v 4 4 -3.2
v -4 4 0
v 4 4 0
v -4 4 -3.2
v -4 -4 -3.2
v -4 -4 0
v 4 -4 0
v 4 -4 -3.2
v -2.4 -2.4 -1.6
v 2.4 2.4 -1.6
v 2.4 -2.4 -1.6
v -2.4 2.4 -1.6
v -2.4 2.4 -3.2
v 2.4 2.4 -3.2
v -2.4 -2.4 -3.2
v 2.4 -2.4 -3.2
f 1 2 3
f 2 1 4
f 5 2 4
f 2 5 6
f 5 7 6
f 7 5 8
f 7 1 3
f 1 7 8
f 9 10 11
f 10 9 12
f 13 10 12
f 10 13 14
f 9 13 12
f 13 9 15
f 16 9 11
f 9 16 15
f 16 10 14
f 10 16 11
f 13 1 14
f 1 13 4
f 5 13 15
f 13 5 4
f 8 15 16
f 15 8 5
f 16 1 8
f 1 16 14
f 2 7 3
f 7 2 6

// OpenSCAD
// file: ../p/4-4edge.scad
use <../lib.scad>
$fa=1; $fs=0.2;
function ldraw_lib__4_4edge(realsolid=false) = [
// 0 Circle 1.0
// 0 Name: 4-4edge.dat
// 0 Author: James Jessiman
// 0 !LDRAW_ORG Primitive UPDATE 2017-01
// 0 !LICENSE Licensed under CC BY 2.0 and CC BY 4.0 : see CAreadme.txt
// 
// 0 BFC CERTIFY CCW
  [0,"BFC","CERTIFY"],
  [0,"BFC","CCW"],
// 
// 0 !HISTORY 1998-12-15 [PTadmin] Official Update 1998-10
// 0 !HISTORY 2005-12-28 [PTadmin] Official Update 2005-01
// 0 !HISTORY 2007-06-24 [PTadmin] Header formatted for Contributor Agreement
// 0 !HISTORY 2008-07-01 [PTadmin] Official Update 2008-01
// 0 !HISTORY 2017-01-15 [Steffen] BFCed
// 0 !HISTORY 2017-12-30 [PTadmin] Official Update 2017-01
// 
// 
// 2 24 1 0 0 0.9239 0 0.3827
  [2,24,1,0,0,0.9239,0,0.3827],
// 2 24 0.9239 0 0.3827 0.7071 0 0.7071
  [2,24,0.9239,0,0.3827,0.7071,0,0.7071],
// 2 24 0.7071 0 0.7071 0.3827 0 0.9239
  [2,24,0.7071,0,0.7071,0.3827,0,0.9239],
// 2 24 0.3827 0 0.9239 0 0 1
  [2,24,0.3827,0,0.9239,0,0,1],
// 2 24 0 0 1 -0.3827 0 0.9239
  [2,24,0,0,1,-0.3827,0,0.9239],
// 2 24 -0.3827 0 0.9239 -0.7071 0 0.7071
  [2,24,-0.3827,0,0.9239,-0.7071,0,0.7071],
// 2 24 -0.7071 0 0.7071 -0.9239 0 0.3827
  [2,24,-0.7071,0,0.7071,-0.9239,0,0.3827],
// 2 24 -0.9239 0 0.3827 -1 0 -0
  [2,24,-0.9239,0,0.3827,-1,0,-0],
// 2 24 -1 0 -0 -0.9239 0 -0.3827
  [2,24,-1,0,-0,-0.9239,0,-0.3827],
// 2 24 -0.9239 0 -0.3827 -0.7071 0 -0.7071
  [2,24,-0.9239,0,-0.3827,-0.7071,0,-0.7071],
// 2 24 -0.7071 0 -0.7071 -0.3827 0 -0.9239
  [2,24,-0.7071,0,-0.7071,-0.3827,0,-0.9239],
// 2 24 -0.3827 0 -0.9239 0 0 -1
  [2,24,-0.3827,0,-0.9239,0,0,-1],
// 2 24 0 0 -1 0.3827 0 -0.9239
  [2,24,0,0,-1,0.3827,0,-0.9239],
// 2 24 0.3827 0 -0.9239 0.7071 0 -0.7071
  [2,24,0.3827,0,-0.9239,0.7071,0,-0.7071],
// 2 24 0.7071 0 -0.7071 0.9239 0 -0.3827
  [2,24,0.7071,0,-0.7071,0.9239,0,-0.3827],
// 2 24 0.9239 0 -0.3827 1 0 0
  [2,24,0.9239,0,-0.3827,1,0,0],
];
module ldraw_lib__4_4edge(step=0, col=false, unit=2/5, alt=false, line=0.2, solid=!$preview)
    makepoly(ldraw_lib__4_4edge(solid), step=step, col=col, unit=unit, alt=alt, line=line, solid=solid);
ldraw_lib__4_4edge(line=0.2);
// file: ../p/4-4disc.scad
use <../lib.scad>
$fa=1; $fs=0.2;
function ldraw_lib__4_4disc(realsolid=false) = [
// 0 Disc 1.0
// 0 Name: 4-4disc.dat
// 0 Author: James Jessiman
// 0 !LDRAW_ORG Primitive UPDATE 2002-02
// 0 !LICENSE Licensed under CC BY 2.0 and CC BY 4.0 : see CAreadme.txt
// 
// 0 BFC CERTIFY CCW
  [0,"BFC","CERTIFY"],
  [0,"BFC","CCW"],
// 
// 0 !HISTORY 1998-12-15 [PTadmin] Official Update 1998-10
// 0 !HISTORY 2002-03-23 [sbliss] Added BFC statement
// 0 !HISTORY 2002-04-25 [PTadmin] Official Update 2002-02
// 0 !HISTORY 2007-06-24 [PTadmin] Header formatted for Contributor Agreement
// 0 !HISTORY 2008-07-01 [PTadmin] Official Update 2008-01
// 
// 
// 3 16 0 0 0 1 0 0 0.9239 0 0.3827
  [3,16,0,0,0,1,0,0,0.9239,0,0.3827],
// 3 16 0 0 0 0.9239 0 0.3827 0.7071 0 0.7071
  [3,16,0,0,0,0.9239,0,0.3827,0.7071,0,0.7071],
// 3 16 0 0 0 0.7071 0 0.7071 0.3827 0 0.9239
  [3,16,0,0,0,0.7071,0,0.7071,0.3827,0,0.9239],
// 3 16 0 0 0 0.3827 0 0.9239 0 0 1
  [3,16,0,0,0,0.3827,0,0.9239,0,0,1],
// 3 16 0 0 0 0 0 1 -0.3827 0 0.9239
  [3,16,0,0,0,0,0,1,-0.3827,0,0.9239],
// 3 16 0 0 0 -0.3827 0 0.9239 -0.7071 0 0.7071
  [3,16,0,0,0,-0.3827,0,0.9239,-0.7071,0,0.7071],
// 3 16 0 0 0 -0.7071 0 0.7071 -0.9239 0 0.3827
  [3,16,0,0,0,-0.7071,0,0.7071,-0.9239,0,0.3827],
// 3 16 0 0 0 -0.9239 0 0.3827 -1 0 -0
  [3,16,0,0,0,-0.9239,0,0.3827,-1,0,-0],
// 3 16 0 0 0 -1 0 -0 -0.9239 0 -0.3827
  [3,16,0,0,0,-1,0,-0,-0.9239,0,-0.3827],
// 3 16 0 0 0 -0.9239 0 -0.3827 -0.7071 0 -0.7071
  [3,16,0,0,0,-0.9239,0,-0.3827,-0.7071,0,-0.7071],
// 3 16 0 0 0 -0.7071 0 -0.7071 -0.3827 0 -0.9239
  [3,16,0,0,0,-0.7071,0,-0.7071,-0.3827,0,-0.9239],
// 3 16 0 0 0 -0.3827 0 -0.9239 0 0 -1
  [3,16,0,0,0,-0.3827,0,-0.9239,0,0,-1],
// 3 16 0 0 0 0 0 -1 0.3827 0 -0.9239
  [3,16,0,0,0,0,0,-1,0.3827,0,-0.9239],
// 3 16 0 0 0 0.3827 0 -0.9239 0.7071 0 -0.7071
  [3,16,0,0,0,0.3827,0,-0.9239,0.7071,0,-0.7071],
// 3 16 0 0 0 0.7071 0 -0.7071 0.9239 0 -0.3827
  [3,16,0,0,0,0.7071,0,-0.7071,0.9239,0,-0.3827],
// 3 16 0 0 0 0.9239 0 -0.3827 1 0 0
  [3,16,0,0,0,0.9239,0,-0.3827,1,0,0],
// 0
];
module ldraw_lib__4_4disc(step=0, col=false, unit=2/5, alt=false, line=0.2, solid=!$preview)
    makepoly(ldraw_lib__4_4disc(solid), step=step, col=col, unit=unit, alt=alt, line=line, solid=solid);
ldraw_lib__4_4disc(line=0.2);
// file: ../p/4-4cyli.scad
use <../lib.scad>
$fa=1; $fs=0.2;
function ldraw_lib__4_4cyli(realsolid=false) = [
// 0 Cylinder 1.0
// 0 Name: 4-4cyli.dat
// 0 Author: James Jessiman
// 0 !LDRAW_ORG Primitive UPDATE 2005-01
// 0 !LICENSE Licensed under CC BY 2.0 and CC BY 4.0 : see CAreadme.txt
// 
// 0 BFC CERTIFY CCW
  [0,"BFC","CERTIFY"],
  [0,"BFC","CCW"],
// 
// 0 !HISTORY 1998-12-15 [PTadmin] Official Update 1998-10
// 0 !HISTORY 2002-03-23 [sbliss] Added BFC statement; merged headers from files in distributions LDraw 0.27 and Complete.
// 0 !HISTORY 2002-04-25 [PTadmin] Official Update 2002-02
// 0 !HISTORY 2004-12-14 [guyvivan] BFC CCW
// 0 !HISTORY 2005-12-28 [PTadmin] Official Update 2005-01
// 0 !HISTORY 2007-06-24 [PTadmin] Header formatted for Contributor Agreement
// 0 !HISTORY 2008-07-01 [PTadmin] Official Update 2008-01
// 
// 
// 4 16 1 1 0 0.9239 1 0.3827 0.9239 0 0.3827 1 0 0
  [4,16,1,1,0,0.9239,1,0.3827,0.9239,0,0.3827,1,0,0],
// 5 24 1 0 0 1 1 0 0.9239 0 0.3827 0.9239 0 -0.3827
  [5,24,1,0,0,1,1,0,0.9239,0,0.3827,0.9239,0,-0.3827],
// 4 16 0.9239 1 0.3827 0.7071 1 0.7071 0.7071 0 0.7071 0.9239 0 0.3827
  [4,16,0.9239,1,0.3827,0.7071,1,0.7071,0.7071,0,0.7071,0.9239,0,0.3827],
// 5 24 0.9239 0 0.3827 0.9239 1 0.3827 0.7071 0 0.7071 1 0 0
  [5,24,0.9239,0,0.3827,0.9239,1,0.3827,0.7071,0,0.7071,1,0,0],
// 4 16 0.7071 1 0.7071 0.3827 1 0.9239 0.3827 0 0.9239 0.7071 0 0.7071
  [4,16,0.7071,1,0.7071,0.3827,1,0.9239,0.3827,0,0.9239,0.7071,0,0.7071],
// 5 24 0.7071 0 0.7071 0.7071 1 0.7071 0.3827 0 0.9239 0.9239 0 0.3827
  [5,24,0.7071,0,0.7071,0.7071,1,0.7071,0.3827,0,0.9239,0.9239,0,0.3827],
// 4 16 0.3827 1 0.9239 0 1 1 0 0 1 0.3827 0 0.9239
  [4,16,0.3827,1,0.9239,0,1,1,0,0,1,0.3827,0,0.9239],
// 5 24 0.3827 0 0.9239 0.3827 1 0.9239 0 0 1 0.7071 0 0.7071
  [5,24,0.3827,0,0.9239,0.3827,1,0.9239,0,0,1,0.7071,0,0.7071],
// 4 16 0 1 1 -0.3827 1 0.9239 -0.3827 0 0.9239 0 0 1
  [4,16,0,1,1,-0.3827,1,0.9239,-0.3827,0,0.9239,0,0,1],
// 5 24 0 0 1 0 1 1 -0.3827 0 0.9239 0.3827 0 0.9239
  [5,24,0,0,1,0,1,1,-0.3827,0,0.9239,0.3827,0,0.9239],
// 4 16 -0.3827 1 0.9239 -0.7071 1 0.7071 -0.7071 0 0.7071 -0.3827 0 0.9239
  [4,16,-0.3827,1,0.9239,-0.7071,1,0.7071,-0.7071,0,0.7071,-0.3827,0,0.9239],
// 5 24 -0.3827 0 0.9239 -0.3827 1 0.9239 -0.7071 0 0.7071 0 0 1
  [5,24,-0.3827,0,0.9239,-0.3827,1,0.9239,-0.7071,0,0.7071,0,0,1],
// 4 16 -0.7071 1 0.7071 -0.9239 1 0.3827 -0.9239 0 0.3827 -0.7071 0 0.7071
  [4,16,-0.7071,1,0.7071,-0.9239,1,0.3827,-0.9239,0,0.3827,-0.7071,0,0.7071],
// 5 24 -0.7071 0 0.7071 -0.7071 1 0.7071 -0.9239 0 0.3827 -0.3827 0 0.9239
  [5,24,-0.7071,0,0.7071,-0.7071,1,0.7071,-0.9239,0,0.3827,-0.3827,0,0.9239],
// 4 16 -0.9239 1 0.3827 -1 1 0 -1 0 0 -0.9239 0 0.3827
  [4,16,-0.9239,1,0.3827,-1,1,0,-1,0,0,-0.9239,0,0.3827],
// 5 24 -0.9239 0 0.3827 -0.9239 1 0.3827 -1 0 0 -0.7071 0 0.7071
  [5,24,-0.9239,0,0.3827,-0.9239,1,0.3827,-1,0,0,-0.7071,0,0.7071],
// 4 16 -1 1 0 -0.9239 1 -0.3827 -0.9239 0 -0.3827 -1 0 0
  [4,16,-1,1,0,-0.9239,1,-0.3827,-0.9239,0,-0.3827,-1,0,0],
// 5 24 -1 0 0 -1 1 0 -0.9239 0 -0.3827 -0.9239 0 0.3827
  [5,24,-1,0,0,-1,1,0,-0.9239,0,-0.3827,-0.9239,0,0.3827],
// 4 16 -0.9239 1 -0.3827 -0.7071 1 -0.7071 -0.7071 0 -0.7071 -0.9239 0 -0.3827
  [4,16,-0.9239,1,-0.3827,-0.7071,1,-0.7071,-0.7071,0,-0.7071,-0.9239,0,-0.3827],
// 5 24 -0.9239 0 -0.3827 -0.9239 1 -0.3827 -0.7071 0 -0.7071 -1 0 0
  [5,24,-0.9239,0,-0.3827,-0.9239,1,-0.3827,-0.7071,0,-0.7071,-1,0,0],
// 4 16 -0.7071 1 -0.7071 -0.3827 1 -0.9239 -0.3827 0 -0.9239 -0.7071 0 -0.7071
  [4,16,-0.7071,1,-0.7071,-0.3827,1,-0.9239,-0.3827,0,-0.9239,-0.7071,0,-0.7071],
// 5 24 -0.7071 0 -0.7071 -0.7071 1 -0.7071 -0.3827 0 -0.9239 -0.9239 0 -0.3827
  [5,24,-0.7071,0,-0.7071,-0.7071,1,-0.7071,-0.3827,0,-0.9239,-0.9239,0,-0.3827],
// 4 16 -0.3827 1 -0.9239 0 1 -1 0 0 -1 -0.3827 0 -0.9239
  [4,16,-0.3827,1,-0.9239,0,1,-1,0,0,-1,-0.3827,0,-0.9239],
// 5 24 -0.3827 0 -0.9239 -0.3827 1 -0.9239 0 0 -1 -0.7071 0 -0.7071
  [5,24,-0.3827,0,-0.9239,-0.3827,1,-0.9239,0,0,-1,-0.7071,0,-0.7071],
// 4 16 0 1 -1 0.3827 1 -0.9239 0.3827 0 -0.9239 0 0 -1
  [4,16,0,1,-1,0.3827,1,-0.9239,0.3827,0,-0.9239,0,0,-1],
// 5 24 0 0 -1 0 1 -1 0.3827 0 -0.9239 -0.3827 0 -0.9239
  [5,24,0,0,-1,0,1,-1,0.3827,0,-0.9239,-0.3827,0,-0.9239],
// 4 16 0.3827 1 -0.9239 0.7071 1 -0.7071 0.7071 0 -0.7071 0.3827 0 -0.9239
  [4,16,0.3827,1,-0.9239,0.7071,1,-0.7071,0.7071,0,-0.7071,0.3827,0,-0.9239],
// 5 24 0.3827 0 -0.9239 0.3827 1 -0.9239 0.7071 0 -0.7071 0 0 -1
  [5,24,0.3827,0,-0.9239,0.3827,1,-0.9239,0.7071,0,-0.7071,0,0,-1],
// 4 16 0.7071 1 -0.7071 0.9239 1 -0.3827 0.9239 0 -0.3827 0.7071 0 -0.7071
  [4,16,0.7071,1,-0.7071,0.9239,1,-0.3827,0.9239,0,-0.3827,0.7071,0,-0.7071],
// 5 24 0.7071 0 -0.7071 0.7071 1 -0.7071 0.9239 0 -0.3827 0.3827 0 -0.9239
  [5,24,0.7071,0,-0.7071,0.7071,1,-0.7071,0.9239,0,-0.3827,0.3827,0,-0.9239],
// 4 16 0.9239 1 -0.3827 1 1 0 1 0 0 0.9239 0 -0.3827
  [4,16,0.9239,1,-0.3827,1,1,0,1,0,0,0.9239,0,-0.3827],
// 5 24 0.9239 0 -0.3827 0.9239 1 -0.3827 1 0 0 0.7071 0 -0.7071
  [5,24,0.9239,0,-0.3827,0.9239,1,-0.3827,1,0,0,0.7071,0,-0.7071],
// 0
];
module ldraw_lib__4_4cyli(step=0, col=false, unit=2/5, alt=false, line=0.2, solid=!$preview)
    makepoly(ldraw_lib__4_4cyli(solid), step=step, col=col, unit=unit, alt=alt, line=line, solid=solid);
ldraw_lib__4_4cyli(line=0.2);
// file: ../p/stud3.scad
use <../lib.scad>
use <4-4cyli.scad>
use <4-4disc.scad>
use <4-4edge.scad>
$fa=1; $fs=0.2;
function ldraw_lib__stud3(realsolid=false) = realsolid ? 
    [openscad(translate([0,0,-eps()], o=cylinder(4+eps(), r=4)),2)] : [
// 0 Stud Tube Solid
// 0 Name: stud3.dat
// 0 Author: James Jessiman
// 0 !LDRAW_ORG Primitive UPDATE 2012-01
// 0 !LICENSE Licensed under CC BY 2.0 and CC BY 4.0 : see CAreadme.txt
// 
// 0 BFC CERTIFY CCW
  [0,"BFC","CERTIFY"],
  [0,"BFC","CCW"],
// 
// 0 !HISTORY 2002-04-04 [sbliss] Modified for BFC compliance
// 0 !HISTORY 2002-04-25 [PTadmin] Official Update 2002-02
// 0 !HISTORY 2007-06-24 [PTadmin] Header formatted for Contributor Agreement
// 0 !HISTORY 2008-07-01 [PTadmin] Official Update 2008-01
// 0 !HISTORY 2012-02-16 [Philo] Changed to CCW
// 0 !HISTORY 2012-03-30 [PTadmin] Official Update 2012-01
// 
// 
// 1 16 0 -4 0 4 0 0 0 1 0 0 0 4 4-4edge.dat
  [1,16,0,-4,0,4,0,0,0,1,0,0,0,4, ldraw_lib__4_4edge(realsolid)],
// 1 16 0 0 0 4 0 0 0 1 0 0 0 4 4-4edge.dat
  [1,16,0,0,0,4,0,0,0,1,0,0,0,4, ldraw_lib__4_4edge(realsolid)],
// 1 16 0 -4 0 4 0 0 0 1 0 0 0 4 4-4disc.dat
  [1,16,0,-4,0,4,0,0,0,1,0,0,0,4, ldraw_lib__4_4disc(realsolid)],
// 1 16 0 -4 0 4 0 0 0 4 0 0 0 4 4-4cyli.dat
  [1,16,0,-4,0,4,0,0,0,4,0,0,0,4, ldraw_lib__4_4cyli(realsolid)],
];
module ldraw_lib__stud3(step=0, col=false, unit=2/5, alt=false, line=0.2, solid=!$preview)
    makepoly(ldraw_lib__stud3(solid), step=step, col=col, unit=unit, alt=alt, line=line, solid=solid);
ldraw_lib__stud3(line=0.2);
// file: ../p/stud.scad
use <../lib.scad>
use <4-4cyli.scad>
use <4-4disc.scad>
use <4-4edge.scad>
$fa=1; $fs=0.2;
function ldraw_lib__stud(realsolid=false) = realsolid ? 
    [openscad(translate([0,0,-eps()], o=cylinder(4+eps(), r=6)),2)] : [
// 0 Stud
// 0 Name: stud.dat
// 0 Author: James Jessiman
// 0 !LDRAW_ORG Primitive UPDATE 2012-01
// 0 !LICENSE Licensed under CC BY 2.0 and CC BY 4.0 : see CAreadme.txt
// 
// 0 BFC CERTIFY CCW
  [0,"BFC","CERTIFY"],
  [0,"BFC","CCW"],
// 
// 0 !HISTORY 2002-04-04 [sbliss] Modified for BFC compliance
// 0 !HISTORY 2002-04-25 [PTadmin] Official Update 2002-02
// 0 !HISTORY 2007-06-24 [PTadmin] Header formatted for Contributor Agreement
// 0 !HISTORY 2008-07-01 [PTadmin] Official Update 2008-01
// 0 !HISTORY 2012-02-16 [Philo] Changed to CCW
// 0 !HISTORY 2012-03-30 [PTadmin] Official Update 2012-01
// 
// 
// 1 16 0 0 0 6 0 0 0 1 0 0 0 6 4-4edge.dat
  [1,16,0,0,0,6,0,0,0,1,0,0,0,6, ldraw_lib__4_4edge(realsolid)],
// 1 16 0 -4 0 6 0 0 0 1 0 0 0 6 4-4edge.dat
  [1,16,0,-4,0,6,0,0,0,1,0,0,0,6, ldraw_lib__4_4edge(realsolid)],
// 1 16 0 0 0 6 0 0 0 -4 0 0 0 6 4-4cyli.dat
  [1,16,0,0,0,6,0,0,0,-4,0,0,0,6, ldraw_lib__4_4cyli(realsolid)],
// 1 16 0 -4 0 6 0 0 0 1 0 0 0 6 4-4disc.dat
  [1,16,0,-4,0,6,0,0,0,1,0,0,0,6, ldraw_lib__4_4disc(realsolid)],
];
module ldraw_lib__stud(step=0, col=false, unit=2/5, alt=false, line=0.2, solid=!$preview)
    makepoly(ldraw_lib__stud(solid), step=step, col=col, unit=unit, alt=alt, line=line, solid=solid);
ldraw_lib__stud(line=0.2);
// file: ../p/box4t.scad
use <../lib.scad>
$fa=1; $fs=0.2;
function ldraw_lib__box4t(realsolid=false) = [
// 0 Box with 4 Adjacent Faces and All Edges
// 0 Name: box4t.dat
// 0 Author: Tore Eriksson [Tore_Eriksson]
// 0 !LDRAW_ORG Primitive UPDATE 2003-02
// 0 !LICENSE Licensed under CC BY 2.0 and CC BY 4.0 : see CAreadme.txt
// 
// 0 BFC CERTIFY CCW
  [0,"BFC","CERTIFY"],
  [0,"BFC","CCW"],
// 
// 0 !HISTORY 1997-09-29 [PTadmin] Official Update 1997-15
// 0 !HISTORY 2002-08-31 [izanette] Modified with WINDZ for BFC compliance
// 0 !HISTORY 2003-08-01 [PTadmin] Official Update 2003-02
// 0 !HISTORY 2007-06-24 [PTadmin] Header formatted for Contributor Agreement
// 0 !HISTORY 2008-07-01 [PTadmin] Official Update 2008-01
// 
// 
// 2 24 1 1 1 -1 1 1
  [2,24,1,1,1,-1,1,1],
// 2 24 -1 1 1 -1 1 -1
  [2,24,-1,1,1,-1,1,-1],
// 2 24 -1 1 -1 1 1 -1
  [2,24,-1,1,-1,1,1,-1],
// 2 24 1 1 -1 1 1 1
  [2,24,1,1,-1,1,1,1],
// 2 24 1 0 1 -1 0 1
  [2,24,1,0,1,-1,0,1],
// 2 24 -1 0 1 -1 0 -1
  [2,24,-1,0,1,-1,0,-1],
// 2 24 -1 0 -1 1 0 -1
  [2,24,-1,0,-1,1,0,-1],
// 2 24 1 0 -1 1 0 1
  [2,24,1,0,-1,1,0,1],
// 2 24 1 0 1 1 1 1
  [2,24,1,0,1,1,1,1],
// 2 24 -1 0 1 -1 1 1
  [2,24,-1,0,1,-1,1,1],
// 2 24 1 0 -1 1 1 -1
  [2,24,1,0,-1,1,1,-1],
// 2 24 -1 0 -1 -1 1 -1
  [2,24,-1,0,-1,-1,1,-1],
// 4 16 1 1 1 1 1 -1 -1 1 -1 -1 1 1
  [4,16,1,1,1,1,1,-1,-1,1,-1,-1,1,1],
// 4 16 1 1 1 -1 1 1 -1 0 1 1 0 1
  [4,16,1,1,1,-1,1,1,-1,0,1,1,0,1],
// 4 16 -1 1 1 -1 1 -1 -1 0 -1 -1 0 1
  [4,16,-1,1,1,-1,1,-1,-1,0,-1,-1,0,1],
// 0 4 16 -1 1 -1 -1 0 -1 1 0 -1 1 1 -1
// 4 16 1 1 -1 1 1 1 1 0 1 1 0 -1
  [4,16,1,1,-1,1,1,1,1,0,1,1,0,-1],
// 0
];
module ldraw_lib__box4t(step=0, col=false, unit=2/5, alt=false, line=0.2, solid=!$preview)
    makepoly(ldraw_lib__box4t(solid), step=step, col=col, unit=unit, alt=alt, line=line, solid=solid);
ldraw_lib__box4t(line=0.2);
// file: s/3004s01.scad
use <../../lib.scad>
use <../../p/box4t.scad>
use <../../p/box5.scad>
use <../../p/stud.scad>
use <../../p/stud3.scad>
$fa=1; $fs=0.2;
function ldraw_lib__s__3004s01(realsolid=false) = [
// 0 ~Brick  1 x  2 without Front Face
// 0 Name: s\3004s01.dat
// 0 Author: James Jessiman
// 0 !LDRAW_ORG Subpart UPDATE 2003-03
// 0 !LICENSE Licensed under CC BY 2.0 and CC BY 4.0 : see CAreadme.txt
// 
// 0 BFC CERTIFY CCW
  [0,"BFC","CERTIFY"],
  [0,"BFC","CCW"],
// 
// 0 !HISTORY 2003-09-07 [jriley] Subfiling, BFC
// 0 !HISTORY 2003-12-19 [PTadmin] Official Update 2003-03
// 0 !HISTORY 2007-08-29 [PTadmin] Header formatted for Contributor Agreement
// 0 !HISTORY 2008-07-01 [PTadmin] Official Update 2008-01
// 
// 
// 1 16 0 4 0 1 0 0 0 -5 0 0 0 1 stud3.dat
  [1,16,0,4,0,1,0,0,0,-5,0,0,0,1, ldraw_lib__stud3(realsolid)],
// 0 BFC INVERTNEXT
  [0,"BFC","INVERTNEXT"],
// 1 16 0 24 0 16 0 0 0 -20 0 0 0 6 box5.dat
  [1,16,0,24,0,16,0,0,0,-20,0,0,0,6, ldraw_lib__box5(realsolid)],
// 4 16 20 24 10 16 24 6 -16 24 6 -20 24 10
  [4,16,20,24,10,16,24,6,-16,24,6,-20,24,10],
// 4 16 -20 24 10 -16 24 6 -16 24 -6 -20 24 -10
  [4,16,-20,24,10,-16,24,6,-16,24,-6,-20,24,-10],
// 4 16 -20 24 -10 -16 24 -6 16 24 -6 20 24 -10
  [4,16,-20,24,-10,-16,24,-6,16,24,-6,20,24,-10],
// 4 16 20 24 -10 16 24 -6 16 24 6 20 24 10
  [4,16,20,24,-10,16,24,-6,16,24,6,20,24,10],
// 1 16 0 24 0 20 0 0 0 -24 0 0 0 10 box4t.dat
  [1,16,0,24,0,20,0,0,0,-24,0,0,0,10, ldraw_lib__box4t(realsolid)],
// 1 16 10 0 0 1 0 0 0 1 0 0 0 1 stud.dat
  [1,16,10,0,0,1,0,0,0,1,0,0,0,1, ldraw_lib__stud(realsolid)],
// 1 16 -10 0 0 1 0 0 0 1 0 0 0 1 stud.dat
  [1,16,-10,0,0,1,0,0,0,1,0,0,0,1, ldraw_lib__stud(realsolid)],
// 0
];
module ldraw_lib__s__3004s01(step=0, col=false, unit=2/5, alt=false, line=0.2, solid=!$preview)
    makepoly(ldraw_lib__s__3004s01(solid), step=step, col=col, unit=unit, alt=alt, line=line, solid=solid);
ldraw_lib__s__3004s01(line=0.2);
// file: ../p/box5.scad
use <../lib.scad>
$fa=1; $fs=0.2;
function ldraw_lib__box5(realsolid=false) = [
// 0 Box with 5 Faces and All Edges
// 0 Name: box5.dat
// 0 Author: James Jessiman
// 0 !LDRAW_ORG Primitive UPDATE 2012-01
// 0 !LICENSE Licensed under CC BY 2.0 and CC BY 4.0 : see CAreadme.txt
// 
// 0 BFC CERTIFY CCW
  [0,"BFC","CERTIFY"],
  [0,"BFC","CCW"],
// 
// 0 !HISTORY 2002-04-03 [sbliss] Modified for BFC compliance
// 0 !HISTORY 2002-04-25 [PTadmin] Official Update 2002-02
// 0 !HISTORY 2007-06-24 [PTadmin] Header formatted for Contributor Agreement
// 0 !HISTORY 2008-07-01 [PTadmin] Official Update 2008-01
// 0 !HISTORY 2012-02-16 [Philo] Changed to CCW
// 0 !HISTORY 2012-03-30 [PTadmin] Official Update 2012-01
// 
// 
// 2 24 1 1 1 -1 1 1
  [2,24,1,1,1,-1,1,1],
// 2 24 -1 1 1 -1 1 -1
  [2,24,-1,1,1,-1,1,-1],
// 2 24 -1 1 -1 1 1 -1
  [2,24,-1,1,-1,1,1,-1],
// 2 24 1 1 -1 1 1 1
  [2,24,1,1,-1,1,1,1],
// 2 24 1 0 1 -1 0 1
  [2,24,1,0,1,-1,0,1],
// 2 24 -1 0 1 -1 0 -1
  [2,24,-1,0,1,-1,0,-1],
// 2 24 -1 0 -1 1 0 -1
  [2,24,-1,0,-1,1,0,-1],
// 2 24 1 0 -1 1 0 1
  [2,24,1,0,-1,1,0,1],
// 2 24 1 0 1 1 1 1
  [2,24,1,0,1,1,1,1],
// 2 24 -1 0 1 -1 1 1
  [2,24,-1,0,1,-1,1,1],
// 2 24 1 0 -1 1 1 -1
  [2,24,1,0,-1,1,1,-1],
// 2 24 -1 0 -1 -1 1 -1
  [2,24,-1,0,-1,-1,1,-1],
// 4 16 -1 1 1 1 1 1 1 1 -1 -1 1 -1
  [4,16,-1,1,1,1,1,1,1,1,-1,-1,1,-1],
// 4 16 -1 1 1 -1 0 1 1 0 1 1 1 1
  [4,16,-1,1,1,-1,0,1,1,0,1,1,1,1],
// 4 16 -1 1 -1 -1 0 -1 -1 0 1 -1 1 1
  [4,16,-1,1,-1,-1,0,-1,-1,0,1,-1,1,1],
// 4 16 1 1 -1 1 0 -1 -1 0 -1 -1 1 -1
  [4,16,1,1,-1,1,0,-1,-1,0,-1,-1,1,-1],
// 4 16 1 1 1 1 0 1 1 0 -1 1 1 -1
  [4,16,1,1,1,1,0,1,1,0,-1,1,1,-1],
];
module ldraw_lib__box5(step=0, col=false, unit=2/5, alt=false, line=0.2, solid=!$preview)
    makepoly(ldraw_lib__box5(solid), step=step, col=col, unit=unit, alt=alt, line=line, solid=solid);
ldraw_lib__box5(line=0.2);
// file: ../p/box4.scad
use <../lib.scad>
$fa=1; $fs=0.2;
function ldraw_lib__box4(realsolid=false) = [
// 0 Box with 4 Faces (2 Parallel Pairs) and All Edges
// 0 Name: box4.dat
// 0 Author: James Jessiman
// 0 !LDRAW_ORG Primitive UPDATE 2012-01
// 0 !LICENSE Licensed under CC BY 2.0 and CC BY 4.0 : see CAreadme.txt
// 
// 0 BFC CERTIFY CCW
  [0,"BFC","CERTIFY"],
  [0,"BFC","CCW"],
// 
// 0 !HISTORY 2002-04-03 [sbliss] Modified for BFC compliance
// 0 !HISTORY 2002-04-25 [PTadmin] Official Update 2002-02
// 0 !HISTORY 2007-06-24 [PTadmin] Header formatted for Contributor Agreement
// 0 !HISTORY 2008-07-01 [PTadmin] Official Update 2008-01
// 0 !HISTORY 2012-02-16 [Philo] Changed to CCW
// 0 !HISTORY 2012-03-30 [PTadmin] Official Update 2012-01
// 
// 
// 2 24 1 1 1 -1 1 1
  [2,24,1,1,1,-1,1,1],
// 2 24 -1 1 1 -1 1 -1
  [2,24,-1,1,1,-1,1,-1],
// 2 24 -1 1 -1 1 1 -1
  [2,24,-1,1,-1,1,1,-1],
// 2 24 1 1 -1 1 1 1
  [2,24,1,1,-1,1,1,1],
// 2 24 1 0 1 -1 0 1
  [2,24,1,0,1,-1,0,1],
// 2 24 -1 0 1 -1 0 -1
  [2,24,-1,0,1,-1,0,-1],
// 2 24 -1 0 -1 1 0 -1
  [2,24,-1,0,-1,1,0,-1],
// 2 24 1 0 -1 1 0 1
  [2,24,1,0,-1,1,0,1],
// 2 24 1 0 1 1 1 1
  [2,24,1,0,1,1,1,1],
// 2 24 -1 0 1 -1 1 1
  [2,24,-1,0,1,-1,1,1],
// 2 24 1 0 -1 1 1 -1
  [2,24,1,0,-1,1,1,-1],
// 2 24 -1 0 -1 -1 1 -1
  [2,24,-1,0,-1,-1,1,-1],
// 4 16 -1 1 1 -1 0 1 1 0 1 1 1 1
  [4,16,-1,1,1,-1,0,1,1,0,1,1,1,1],
// 4 16 -1 1 -1 -1 0 -1 -1 0 1 -1 1 1
  [4,16,-1,1,-1,-1,0,-1,-1,0,1,-1,1,1],
// 4 16 1 1 -1 1 0 -1 -1 0 -1 -1 1 -1
  [4,16,1,1,-1,1,0,-1,-1,0,-1,-1,1,-1],
// 4 16 1 1 1 1 0 1 1 0 -1 1 1 -1
  [4,16,1,1,1,1,0,1,1,0,-1,1,1,-1],
];
module ldraw_lib__box4(step=0, col=false, unit=2/5, alt=false, line=0.2, solid=!$preview)
    makepoly(ldraw_lib__box4(solid), step=step, col=col, unit=unit, alt=alt, line=line, solid=solid);
ldraw_lib__box4(line=0.2);
// file: 3004.scad
use <../lib.scad>
use <s/3004s01.scad>
$fa=1; $fs=0.2;
function ldraw_lib__3004(realsolid=false) = [
// 0 Brick  1 x  2
// 0 Name: 3004.dat
// 0 Author: James Jessiman
// 0 !LDRAW_ORG Part UPDATE 2022-05
// 0 !LICENSE Licensed under CC BY 2.0 and CC BY 4.0 : see CAreadme.txt
// 
// 0 BFC CERTIFY CCW
  [0,"BFC","CERTIFY"],
  [0,"BFC","CCW"],
// 
// 0 !HISTORY 2001-10-26 [PTadmin] Official Update 2001-01
// 0 !HISTORY 2002-05-07 {unknown} BFC Certification
// 0 !HISTORY 2002-06-11 [PTadmin] Official Update 2002-03
// 0 !HISTORY 2007-05-07 [PTadmin] Header formatted for Contributor Agreement
// 0 !HISTORY 2008-07-01 [PTadmin] Official Update 2008-01
// 0 !HISTORY 2022-08-04 [MagFors] Using subfile
// 0 !HISTORY 2022-09-15 [PTadmin] Official Update 2022-05
// 
// 
// 1 16 0 0 0 1 0 0 0 1 0 0 0 1 s\3004s01.dat
  [1,16,0,0,0,1,0,0,0,1,0,0,0,1, ldraw_lib__s__3004s01(realsolid)],
// 4 16 -20 24 -10 20 24 -10 20 0 -10 -20 0 -10
  [4,16,-20,24,-10,20,24,-10,20,0,-10,-20,0,-10],
];
module ldraw_lib__3004(step=0, col=false, unit=2/5, alt=false, line=0.2, solid=!$preview)
    makepoly(ldraw_lib__3004(solid), step=step, col=col, unit=unit, alt=alt, line=line, solid=solid);
ldraw_lib__3004(line=0.2);
// file: 3070a.scad
use <../lib.scad>
use <../p/box4.scad>
use <../p/box5.scad>
$fa=1; $fs=0.2;
function ldraw_lib__3070a(realsolid=false) = [
// 0 Tile  1 x  1 without Groove
// 0 Name: 3070a.dat
// 0 Author: James Jessiman
// 0 !LDRAW_ORG Part UPDATE 2003-03
// 0 !LICENSE Licensed under CC BY 2.0 and CC BY 4.0 : see CAreadme.txt
// 
// 0 BFC CERTIFY CW
  [0,"BFC","CERTIFY"],
  [0,"BFC","CW"],
// 
// 0 !HISTORY 2003-07-01 [Steffen] BFCed
// 0 !HISTORY 2003-12-19 [PTadmin] Official Update 2003-03
// 0 !HISTORY 2007-10-13 [PTadmin] Header formatted for Contributor Agreement
// 0 !HISTORY 2008-07-01 [PTadmin] Official Update 2008-01
// 
// 
// 1 16 0 8 0 10 0 0 0 -8 0 0 0 10 box4.dat
  [1,16,0,8,0,10,0,0,0,-8,0,0,0,10, ldraw_lib__box4(realsolid)],
// 0 BFC INVERTNEXT
  [0,"BFC","INVERTNEXT"],
// 1 16 0 8 0 6 0 0 0 -4 0 0 0 6 box5.dat
  [1,16,0,8,0,6,0,0,0,-4,0,0,0,6, ldraw_lib__box5(realsolid)],
// 4 16 -10 8 10 -6 8 6 6 8 6 10 8 10
  [4,16,-10,8,10,-6,8,6,6,8,6,10,8,10],
// 4 16 -10 8 -10 -6 8 -6 -6 8 6 -10 8 10
  [4,16,-10,8,-10,-6,8,-6,-6,8,6,-10,8,10],
// 4 16 10 8 -10 6 8 -6 -6 8 -6 -10 8 -10
  [4,16,10,8,-10,6,8,-6,-6,8,-6,-10,8,-10],
// 4 16 10 8 10 6 8 6 6 8 -6 10 8 -10
  [4,16,10,8,10,6,8,6,6,8,-6,10,8,-10],
// 4 16 -10 0 10 10 0 10 10 0 -10 -10 0 -10
  [4,16,-10,0,10,10,0,10,10,0,-10,-10,0,-10],
// 0
];
module ldraw_lib__3070a(step=0, col=false, unit=2/5, alt=false, line=0.2, solid=!$preview)
    makepoly(ldraw_lib__3070a(solid), step=step, col=col, unit=unit, alt=alt, line=line, solid=solid);
ldraw_lib__3070a(line=0.2);
// main file
use <../lib.scad>
use <3070a.scad>
$fa=1; $fs=0.2;
function ldraw_lib__3070(realsolid=false) = [
// 0 ~Moved to 3070a
// 0 Name: 3070.dat
// 0 Author: [PTadmin]
// 0 !LDRAW_ORG Part UPDATE 2003-03
// 0 !LICENSE Licensed under CC BY 4.0 : see CAreadme.txt
// 
// 0 BFC CERTIFY CCW
  [0,"BFC","CERTIFY"],
  [0,"BFC","CCW"],
// 
// 0 !HISTORY 2003-12-19 [PTadmin] Official Update 2003-03
// 0 !HISTORY 2007-10-12 [PTadmin] Header formatted for Contributor Agreement
// 0 !HISTORY 2008-07-01 [PTadmin] Official Update 2008-01
// 
// 
// 1 16 0 0 0 1 0 0 0 1 0 0 0 1 3070a.dat
  [1,16,0,0,0,1,0,0,0,1,0,0,0,1, ldraw_lib__3070a(realsolid)],
];
module ldraw_lib__3070(step=0, col=false, unit=2/5, alt=false, line=0.2, solid=!$preview)
    makepoly(ldraw_lib__3070(solid), step=step, col=col, unit=unit, alt=alt, line=line, solid=solid);
ldraw_lib__3070(line=0.2);
